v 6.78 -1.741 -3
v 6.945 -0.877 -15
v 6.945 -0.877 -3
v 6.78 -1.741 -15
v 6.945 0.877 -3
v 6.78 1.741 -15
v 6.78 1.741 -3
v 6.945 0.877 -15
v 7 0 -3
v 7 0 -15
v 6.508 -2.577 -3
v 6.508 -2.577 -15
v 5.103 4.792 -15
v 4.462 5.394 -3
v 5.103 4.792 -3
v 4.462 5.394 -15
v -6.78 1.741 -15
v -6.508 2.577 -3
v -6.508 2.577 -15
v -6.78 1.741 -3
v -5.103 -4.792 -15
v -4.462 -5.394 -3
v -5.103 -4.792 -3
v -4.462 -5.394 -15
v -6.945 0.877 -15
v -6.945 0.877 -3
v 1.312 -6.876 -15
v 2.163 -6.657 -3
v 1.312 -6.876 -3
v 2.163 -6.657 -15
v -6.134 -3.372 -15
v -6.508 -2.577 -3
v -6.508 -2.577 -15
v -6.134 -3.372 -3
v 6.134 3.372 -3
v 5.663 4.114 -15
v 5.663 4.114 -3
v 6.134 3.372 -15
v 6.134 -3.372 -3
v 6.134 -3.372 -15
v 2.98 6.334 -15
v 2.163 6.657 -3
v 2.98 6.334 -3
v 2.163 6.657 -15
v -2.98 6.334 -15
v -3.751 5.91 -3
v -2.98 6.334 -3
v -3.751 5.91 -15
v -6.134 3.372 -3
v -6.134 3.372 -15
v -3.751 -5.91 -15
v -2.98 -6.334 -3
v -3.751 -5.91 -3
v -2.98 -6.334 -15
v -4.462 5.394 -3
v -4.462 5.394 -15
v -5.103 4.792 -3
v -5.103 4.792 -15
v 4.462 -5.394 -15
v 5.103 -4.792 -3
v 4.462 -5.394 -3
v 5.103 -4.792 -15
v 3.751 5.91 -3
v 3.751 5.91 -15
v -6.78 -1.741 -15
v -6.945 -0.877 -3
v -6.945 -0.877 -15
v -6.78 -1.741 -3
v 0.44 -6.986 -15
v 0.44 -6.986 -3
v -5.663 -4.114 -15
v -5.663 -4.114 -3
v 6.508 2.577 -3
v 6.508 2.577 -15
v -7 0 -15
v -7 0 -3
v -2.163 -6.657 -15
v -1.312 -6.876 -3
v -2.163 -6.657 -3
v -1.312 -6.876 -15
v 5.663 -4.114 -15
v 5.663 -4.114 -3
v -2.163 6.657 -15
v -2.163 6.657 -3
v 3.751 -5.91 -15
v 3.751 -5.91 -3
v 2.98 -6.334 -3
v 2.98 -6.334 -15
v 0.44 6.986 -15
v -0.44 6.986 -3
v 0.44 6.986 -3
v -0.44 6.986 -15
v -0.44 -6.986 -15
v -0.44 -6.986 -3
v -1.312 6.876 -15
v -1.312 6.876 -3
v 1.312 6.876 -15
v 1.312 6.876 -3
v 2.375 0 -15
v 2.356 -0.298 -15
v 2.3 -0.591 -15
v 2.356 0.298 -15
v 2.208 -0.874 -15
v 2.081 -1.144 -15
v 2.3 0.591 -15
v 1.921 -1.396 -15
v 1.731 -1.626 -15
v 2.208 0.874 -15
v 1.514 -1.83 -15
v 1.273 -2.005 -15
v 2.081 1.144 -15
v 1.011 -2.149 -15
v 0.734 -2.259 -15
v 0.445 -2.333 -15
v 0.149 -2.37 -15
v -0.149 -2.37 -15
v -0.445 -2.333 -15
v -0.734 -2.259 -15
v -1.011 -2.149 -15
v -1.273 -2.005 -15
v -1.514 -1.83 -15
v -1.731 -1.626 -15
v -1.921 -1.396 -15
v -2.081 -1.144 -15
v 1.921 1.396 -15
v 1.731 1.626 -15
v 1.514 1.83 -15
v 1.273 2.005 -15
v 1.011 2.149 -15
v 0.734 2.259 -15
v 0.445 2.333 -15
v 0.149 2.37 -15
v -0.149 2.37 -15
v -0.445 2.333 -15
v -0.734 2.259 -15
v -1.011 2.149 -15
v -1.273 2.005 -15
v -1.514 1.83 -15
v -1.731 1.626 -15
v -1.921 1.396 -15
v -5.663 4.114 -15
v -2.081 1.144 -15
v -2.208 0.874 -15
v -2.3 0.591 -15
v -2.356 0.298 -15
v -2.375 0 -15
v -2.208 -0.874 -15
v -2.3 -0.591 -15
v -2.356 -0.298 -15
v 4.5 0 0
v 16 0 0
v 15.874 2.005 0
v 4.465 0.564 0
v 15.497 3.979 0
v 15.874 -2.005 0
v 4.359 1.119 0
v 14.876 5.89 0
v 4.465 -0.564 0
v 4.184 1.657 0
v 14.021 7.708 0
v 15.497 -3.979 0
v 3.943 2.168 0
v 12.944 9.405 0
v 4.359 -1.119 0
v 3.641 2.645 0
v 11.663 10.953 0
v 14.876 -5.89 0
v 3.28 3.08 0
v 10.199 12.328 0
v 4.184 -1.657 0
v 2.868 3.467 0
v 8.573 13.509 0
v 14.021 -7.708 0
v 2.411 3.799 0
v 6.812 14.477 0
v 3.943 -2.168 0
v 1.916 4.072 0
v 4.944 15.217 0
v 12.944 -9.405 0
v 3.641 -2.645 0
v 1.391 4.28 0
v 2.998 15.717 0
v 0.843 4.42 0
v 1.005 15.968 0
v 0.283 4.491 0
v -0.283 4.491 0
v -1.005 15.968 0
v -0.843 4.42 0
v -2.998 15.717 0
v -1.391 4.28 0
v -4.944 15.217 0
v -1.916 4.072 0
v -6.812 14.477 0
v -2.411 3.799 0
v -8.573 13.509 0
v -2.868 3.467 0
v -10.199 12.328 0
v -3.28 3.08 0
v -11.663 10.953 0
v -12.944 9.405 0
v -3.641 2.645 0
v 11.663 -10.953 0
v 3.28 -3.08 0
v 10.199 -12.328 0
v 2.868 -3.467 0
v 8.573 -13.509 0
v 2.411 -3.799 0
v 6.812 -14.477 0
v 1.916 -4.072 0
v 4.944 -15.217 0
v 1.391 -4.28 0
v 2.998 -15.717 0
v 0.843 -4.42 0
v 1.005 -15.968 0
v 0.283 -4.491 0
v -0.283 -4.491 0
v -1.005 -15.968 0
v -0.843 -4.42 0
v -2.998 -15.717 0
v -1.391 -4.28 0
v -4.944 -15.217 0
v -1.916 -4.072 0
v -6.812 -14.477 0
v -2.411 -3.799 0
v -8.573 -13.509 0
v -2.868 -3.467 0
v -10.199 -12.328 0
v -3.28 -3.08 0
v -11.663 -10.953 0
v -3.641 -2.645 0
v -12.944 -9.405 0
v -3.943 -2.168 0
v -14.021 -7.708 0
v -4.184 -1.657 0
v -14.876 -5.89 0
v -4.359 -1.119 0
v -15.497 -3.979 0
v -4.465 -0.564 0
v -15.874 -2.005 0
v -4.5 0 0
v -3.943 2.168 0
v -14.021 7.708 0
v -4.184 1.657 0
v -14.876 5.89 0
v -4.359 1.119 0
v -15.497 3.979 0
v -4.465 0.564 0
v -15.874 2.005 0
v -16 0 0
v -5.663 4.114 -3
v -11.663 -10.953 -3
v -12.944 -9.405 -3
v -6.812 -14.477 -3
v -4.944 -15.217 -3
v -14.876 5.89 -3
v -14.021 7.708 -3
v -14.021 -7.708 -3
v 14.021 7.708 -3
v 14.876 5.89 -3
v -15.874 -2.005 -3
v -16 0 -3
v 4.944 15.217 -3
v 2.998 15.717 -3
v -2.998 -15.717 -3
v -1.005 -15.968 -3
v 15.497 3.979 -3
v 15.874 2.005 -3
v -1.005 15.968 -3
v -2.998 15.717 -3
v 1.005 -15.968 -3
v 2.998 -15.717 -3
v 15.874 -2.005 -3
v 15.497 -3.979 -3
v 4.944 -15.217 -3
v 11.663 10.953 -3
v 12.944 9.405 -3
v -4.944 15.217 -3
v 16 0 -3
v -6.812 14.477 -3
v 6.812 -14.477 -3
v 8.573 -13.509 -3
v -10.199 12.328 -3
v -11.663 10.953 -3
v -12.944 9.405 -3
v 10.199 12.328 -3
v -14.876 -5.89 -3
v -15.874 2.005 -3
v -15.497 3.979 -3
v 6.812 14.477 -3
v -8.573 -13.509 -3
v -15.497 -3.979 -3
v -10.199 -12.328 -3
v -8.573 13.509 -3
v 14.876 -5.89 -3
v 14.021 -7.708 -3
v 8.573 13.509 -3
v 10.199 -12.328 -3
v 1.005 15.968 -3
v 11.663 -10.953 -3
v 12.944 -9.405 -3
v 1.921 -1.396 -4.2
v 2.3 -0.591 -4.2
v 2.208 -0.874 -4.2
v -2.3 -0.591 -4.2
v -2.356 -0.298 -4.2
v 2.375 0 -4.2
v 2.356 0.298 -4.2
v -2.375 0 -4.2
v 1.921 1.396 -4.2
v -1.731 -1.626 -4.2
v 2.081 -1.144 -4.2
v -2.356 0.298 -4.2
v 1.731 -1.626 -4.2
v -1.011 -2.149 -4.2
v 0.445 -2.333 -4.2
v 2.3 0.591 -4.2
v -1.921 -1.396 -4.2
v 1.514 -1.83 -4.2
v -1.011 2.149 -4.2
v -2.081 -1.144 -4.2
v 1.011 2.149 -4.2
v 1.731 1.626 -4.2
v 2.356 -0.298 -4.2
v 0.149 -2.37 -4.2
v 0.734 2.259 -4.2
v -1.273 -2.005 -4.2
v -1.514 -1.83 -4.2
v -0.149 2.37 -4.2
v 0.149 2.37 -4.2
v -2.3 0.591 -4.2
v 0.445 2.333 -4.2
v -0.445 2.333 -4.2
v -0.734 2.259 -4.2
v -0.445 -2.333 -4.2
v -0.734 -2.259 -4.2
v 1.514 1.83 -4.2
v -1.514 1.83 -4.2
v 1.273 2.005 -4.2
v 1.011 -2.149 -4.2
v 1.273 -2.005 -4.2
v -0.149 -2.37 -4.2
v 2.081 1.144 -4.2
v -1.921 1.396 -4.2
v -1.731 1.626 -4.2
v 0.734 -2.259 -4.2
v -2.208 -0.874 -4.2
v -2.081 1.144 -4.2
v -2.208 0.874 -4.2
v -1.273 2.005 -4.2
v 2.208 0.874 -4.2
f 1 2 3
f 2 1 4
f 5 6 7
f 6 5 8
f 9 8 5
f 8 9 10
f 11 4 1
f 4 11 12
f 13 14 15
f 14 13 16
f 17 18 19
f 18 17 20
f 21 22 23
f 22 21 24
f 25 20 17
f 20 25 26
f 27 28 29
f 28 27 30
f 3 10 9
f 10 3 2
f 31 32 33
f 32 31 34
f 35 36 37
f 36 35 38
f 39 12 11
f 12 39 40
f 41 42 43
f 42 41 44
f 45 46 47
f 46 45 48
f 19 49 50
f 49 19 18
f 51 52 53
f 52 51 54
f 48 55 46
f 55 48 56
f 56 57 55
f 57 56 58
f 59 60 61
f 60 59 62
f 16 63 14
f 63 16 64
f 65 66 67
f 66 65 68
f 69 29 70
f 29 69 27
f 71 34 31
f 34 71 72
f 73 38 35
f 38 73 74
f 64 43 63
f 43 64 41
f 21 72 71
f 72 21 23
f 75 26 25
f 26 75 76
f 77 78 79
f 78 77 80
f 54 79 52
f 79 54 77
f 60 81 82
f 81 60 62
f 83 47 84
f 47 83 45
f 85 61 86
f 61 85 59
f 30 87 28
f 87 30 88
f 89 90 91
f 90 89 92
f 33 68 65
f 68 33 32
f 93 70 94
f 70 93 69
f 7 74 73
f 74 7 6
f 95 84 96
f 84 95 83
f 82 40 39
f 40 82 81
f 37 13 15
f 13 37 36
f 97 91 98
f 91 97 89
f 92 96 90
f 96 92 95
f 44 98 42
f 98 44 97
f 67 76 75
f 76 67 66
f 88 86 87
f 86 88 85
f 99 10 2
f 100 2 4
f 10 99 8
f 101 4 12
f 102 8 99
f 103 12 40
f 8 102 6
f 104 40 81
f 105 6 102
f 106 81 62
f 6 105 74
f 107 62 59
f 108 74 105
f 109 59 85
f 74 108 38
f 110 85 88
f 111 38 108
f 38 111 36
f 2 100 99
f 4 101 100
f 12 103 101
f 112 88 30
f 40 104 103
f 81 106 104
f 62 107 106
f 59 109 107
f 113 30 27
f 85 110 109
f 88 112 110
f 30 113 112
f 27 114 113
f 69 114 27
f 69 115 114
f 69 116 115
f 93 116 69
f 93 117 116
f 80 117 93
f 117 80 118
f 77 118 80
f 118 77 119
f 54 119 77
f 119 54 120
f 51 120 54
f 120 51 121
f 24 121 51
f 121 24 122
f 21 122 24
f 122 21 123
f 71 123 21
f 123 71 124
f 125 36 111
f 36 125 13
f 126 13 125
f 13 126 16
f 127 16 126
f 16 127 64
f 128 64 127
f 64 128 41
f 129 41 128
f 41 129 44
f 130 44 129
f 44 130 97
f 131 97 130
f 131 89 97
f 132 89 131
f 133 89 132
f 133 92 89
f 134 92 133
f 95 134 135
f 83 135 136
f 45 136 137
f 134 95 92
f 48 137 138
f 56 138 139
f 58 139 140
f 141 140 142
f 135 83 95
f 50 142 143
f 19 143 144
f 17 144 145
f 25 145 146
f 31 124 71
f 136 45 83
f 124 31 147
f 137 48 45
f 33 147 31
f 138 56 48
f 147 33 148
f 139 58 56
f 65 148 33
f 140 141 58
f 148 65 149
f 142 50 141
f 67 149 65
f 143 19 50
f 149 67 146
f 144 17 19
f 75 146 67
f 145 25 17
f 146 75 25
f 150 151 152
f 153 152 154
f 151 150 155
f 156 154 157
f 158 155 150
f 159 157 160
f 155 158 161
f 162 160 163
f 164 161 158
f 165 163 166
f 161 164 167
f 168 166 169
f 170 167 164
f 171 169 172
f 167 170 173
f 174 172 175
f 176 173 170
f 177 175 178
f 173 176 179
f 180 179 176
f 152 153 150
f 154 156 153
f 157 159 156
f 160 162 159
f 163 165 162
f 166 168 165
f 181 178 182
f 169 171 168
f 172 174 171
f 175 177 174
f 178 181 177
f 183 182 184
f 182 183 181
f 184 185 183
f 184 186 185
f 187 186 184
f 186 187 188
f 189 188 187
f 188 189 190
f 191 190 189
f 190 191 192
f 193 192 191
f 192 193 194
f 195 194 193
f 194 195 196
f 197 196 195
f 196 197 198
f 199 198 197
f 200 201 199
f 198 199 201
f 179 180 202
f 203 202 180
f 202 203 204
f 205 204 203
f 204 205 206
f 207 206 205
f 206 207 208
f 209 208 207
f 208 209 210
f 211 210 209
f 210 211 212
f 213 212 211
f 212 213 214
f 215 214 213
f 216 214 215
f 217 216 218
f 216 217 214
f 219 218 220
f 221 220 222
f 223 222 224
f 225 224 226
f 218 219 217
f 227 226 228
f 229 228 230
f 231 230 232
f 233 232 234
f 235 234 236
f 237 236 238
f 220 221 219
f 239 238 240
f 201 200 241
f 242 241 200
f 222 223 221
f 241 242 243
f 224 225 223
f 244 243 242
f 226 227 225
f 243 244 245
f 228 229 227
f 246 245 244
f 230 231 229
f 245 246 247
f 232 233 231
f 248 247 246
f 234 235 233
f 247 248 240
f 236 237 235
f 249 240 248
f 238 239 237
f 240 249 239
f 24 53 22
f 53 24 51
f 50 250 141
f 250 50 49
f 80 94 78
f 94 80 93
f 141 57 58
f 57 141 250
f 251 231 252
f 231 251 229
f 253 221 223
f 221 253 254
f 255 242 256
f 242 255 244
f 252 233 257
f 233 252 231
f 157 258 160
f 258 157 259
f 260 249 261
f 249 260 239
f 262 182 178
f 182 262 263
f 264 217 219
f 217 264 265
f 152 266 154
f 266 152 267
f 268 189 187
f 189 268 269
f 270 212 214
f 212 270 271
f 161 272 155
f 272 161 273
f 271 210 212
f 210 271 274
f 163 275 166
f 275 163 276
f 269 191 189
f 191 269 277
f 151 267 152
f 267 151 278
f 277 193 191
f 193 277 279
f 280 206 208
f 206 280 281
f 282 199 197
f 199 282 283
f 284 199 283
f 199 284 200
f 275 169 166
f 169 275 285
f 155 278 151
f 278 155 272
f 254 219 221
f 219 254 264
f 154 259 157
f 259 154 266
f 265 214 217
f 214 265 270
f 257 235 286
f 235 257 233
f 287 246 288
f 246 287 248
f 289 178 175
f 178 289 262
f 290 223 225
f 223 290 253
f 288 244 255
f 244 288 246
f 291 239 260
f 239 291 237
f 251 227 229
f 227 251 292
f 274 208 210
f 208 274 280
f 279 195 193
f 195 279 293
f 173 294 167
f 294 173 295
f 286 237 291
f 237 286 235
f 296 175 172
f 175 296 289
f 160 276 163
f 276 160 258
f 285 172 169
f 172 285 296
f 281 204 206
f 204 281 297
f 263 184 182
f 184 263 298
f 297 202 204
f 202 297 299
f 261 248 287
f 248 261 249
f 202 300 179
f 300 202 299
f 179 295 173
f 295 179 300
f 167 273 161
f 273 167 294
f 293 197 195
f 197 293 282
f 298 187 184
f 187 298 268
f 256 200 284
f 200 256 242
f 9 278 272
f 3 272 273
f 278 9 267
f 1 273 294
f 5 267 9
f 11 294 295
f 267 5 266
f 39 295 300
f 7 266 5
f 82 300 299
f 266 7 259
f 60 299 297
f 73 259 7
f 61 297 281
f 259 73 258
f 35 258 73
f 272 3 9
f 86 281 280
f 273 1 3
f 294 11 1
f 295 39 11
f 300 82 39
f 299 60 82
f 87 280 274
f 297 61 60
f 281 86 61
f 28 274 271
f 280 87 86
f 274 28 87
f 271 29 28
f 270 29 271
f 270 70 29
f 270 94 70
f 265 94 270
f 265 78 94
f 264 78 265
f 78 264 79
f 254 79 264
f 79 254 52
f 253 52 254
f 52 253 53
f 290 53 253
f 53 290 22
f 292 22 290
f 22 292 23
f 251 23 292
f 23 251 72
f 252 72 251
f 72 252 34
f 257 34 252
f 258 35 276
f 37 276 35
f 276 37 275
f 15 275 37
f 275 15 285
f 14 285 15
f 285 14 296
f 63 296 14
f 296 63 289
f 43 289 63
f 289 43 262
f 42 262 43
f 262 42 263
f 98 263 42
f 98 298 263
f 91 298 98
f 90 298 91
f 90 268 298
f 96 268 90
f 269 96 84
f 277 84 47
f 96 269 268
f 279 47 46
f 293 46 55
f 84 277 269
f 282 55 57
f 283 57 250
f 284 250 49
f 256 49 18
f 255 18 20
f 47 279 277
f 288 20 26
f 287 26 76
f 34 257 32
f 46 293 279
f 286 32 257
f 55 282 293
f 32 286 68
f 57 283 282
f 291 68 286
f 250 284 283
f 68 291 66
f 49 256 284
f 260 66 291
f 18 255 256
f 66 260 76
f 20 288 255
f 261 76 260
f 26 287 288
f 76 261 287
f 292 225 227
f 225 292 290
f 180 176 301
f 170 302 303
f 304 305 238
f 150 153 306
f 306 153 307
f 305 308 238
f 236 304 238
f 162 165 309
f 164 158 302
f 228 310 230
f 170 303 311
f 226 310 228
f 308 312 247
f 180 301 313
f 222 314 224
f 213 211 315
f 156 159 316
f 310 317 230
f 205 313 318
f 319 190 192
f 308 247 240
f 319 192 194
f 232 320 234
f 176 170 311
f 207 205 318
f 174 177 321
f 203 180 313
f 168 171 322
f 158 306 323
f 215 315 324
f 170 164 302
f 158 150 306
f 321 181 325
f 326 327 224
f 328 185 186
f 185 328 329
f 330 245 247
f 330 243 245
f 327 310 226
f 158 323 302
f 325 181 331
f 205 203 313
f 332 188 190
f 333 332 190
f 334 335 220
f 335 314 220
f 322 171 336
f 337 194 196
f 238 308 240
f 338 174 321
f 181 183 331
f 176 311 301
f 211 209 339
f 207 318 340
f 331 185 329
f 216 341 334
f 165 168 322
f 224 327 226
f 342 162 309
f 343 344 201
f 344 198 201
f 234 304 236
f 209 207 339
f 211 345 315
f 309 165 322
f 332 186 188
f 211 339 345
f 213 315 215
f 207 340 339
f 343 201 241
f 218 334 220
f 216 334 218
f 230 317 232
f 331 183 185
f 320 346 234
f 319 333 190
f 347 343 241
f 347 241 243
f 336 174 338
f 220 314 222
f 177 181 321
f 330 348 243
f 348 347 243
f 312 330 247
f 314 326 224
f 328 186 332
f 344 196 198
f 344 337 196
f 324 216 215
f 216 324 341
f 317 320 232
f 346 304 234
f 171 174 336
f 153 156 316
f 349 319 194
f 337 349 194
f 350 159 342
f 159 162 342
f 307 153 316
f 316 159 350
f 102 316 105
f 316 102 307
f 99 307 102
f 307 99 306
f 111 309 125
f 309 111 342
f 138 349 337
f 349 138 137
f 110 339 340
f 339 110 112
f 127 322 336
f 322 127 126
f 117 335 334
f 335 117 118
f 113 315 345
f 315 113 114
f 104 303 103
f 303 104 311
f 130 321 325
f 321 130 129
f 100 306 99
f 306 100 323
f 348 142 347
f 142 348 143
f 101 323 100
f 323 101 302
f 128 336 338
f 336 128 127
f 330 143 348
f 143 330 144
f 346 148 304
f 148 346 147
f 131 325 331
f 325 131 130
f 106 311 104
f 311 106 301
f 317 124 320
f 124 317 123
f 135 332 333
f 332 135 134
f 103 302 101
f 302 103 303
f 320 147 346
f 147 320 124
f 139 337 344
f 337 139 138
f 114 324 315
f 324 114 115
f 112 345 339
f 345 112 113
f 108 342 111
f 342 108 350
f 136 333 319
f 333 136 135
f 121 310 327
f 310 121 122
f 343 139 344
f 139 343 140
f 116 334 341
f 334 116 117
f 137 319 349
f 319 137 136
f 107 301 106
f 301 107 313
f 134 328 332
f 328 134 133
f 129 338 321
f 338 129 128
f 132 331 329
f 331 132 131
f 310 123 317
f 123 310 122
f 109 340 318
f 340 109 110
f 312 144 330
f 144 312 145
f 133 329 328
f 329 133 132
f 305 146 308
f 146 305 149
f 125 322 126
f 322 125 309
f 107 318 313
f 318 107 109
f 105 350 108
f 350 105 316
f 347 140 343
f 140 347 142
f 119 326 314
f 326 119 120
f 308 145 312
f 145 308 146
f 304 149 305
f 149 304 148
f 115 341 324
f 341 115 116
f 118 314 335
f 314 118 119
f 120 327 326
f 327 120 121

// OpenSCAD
$fn = 50;


difference() {
	union() {
		translate(v = [0, 0, -15.0000000000]) {
			cylinder(h = 15, r = 7.0000000000);
		}
		translate(v = [0, 0, -3.0000000000]) {
			cylinder(h = 3, r = 16.0000000000);
		}
	}
	union() {
		translate(v = [0, 0, 0]) {
			rotate(a = [0, 0, 0]) {
				difference() {
					union() {
						#translate(v = [0, 0, -15.0000000000]) {
							cylinder(h = 15, r = 2.2500000000);
						}
						#translate(v = [0, 0, -4.2000000000]) {
							cylinder(h = 4.2000000000, r = 7.0000000000, r1 = 2.3750000000, r2 = 4.5000000000);
						}
						#translate(v = [0, 0, -15.0000000000]) {
							cylinder(h = 15, r = 2.3750000000);
						}
						#translate(v = [0, 0, -15.0000000000]) {
							cylinder(h = 15, r = 2.2500000000);
						}
					}
					union();
				}
			}
		}
	}
}
